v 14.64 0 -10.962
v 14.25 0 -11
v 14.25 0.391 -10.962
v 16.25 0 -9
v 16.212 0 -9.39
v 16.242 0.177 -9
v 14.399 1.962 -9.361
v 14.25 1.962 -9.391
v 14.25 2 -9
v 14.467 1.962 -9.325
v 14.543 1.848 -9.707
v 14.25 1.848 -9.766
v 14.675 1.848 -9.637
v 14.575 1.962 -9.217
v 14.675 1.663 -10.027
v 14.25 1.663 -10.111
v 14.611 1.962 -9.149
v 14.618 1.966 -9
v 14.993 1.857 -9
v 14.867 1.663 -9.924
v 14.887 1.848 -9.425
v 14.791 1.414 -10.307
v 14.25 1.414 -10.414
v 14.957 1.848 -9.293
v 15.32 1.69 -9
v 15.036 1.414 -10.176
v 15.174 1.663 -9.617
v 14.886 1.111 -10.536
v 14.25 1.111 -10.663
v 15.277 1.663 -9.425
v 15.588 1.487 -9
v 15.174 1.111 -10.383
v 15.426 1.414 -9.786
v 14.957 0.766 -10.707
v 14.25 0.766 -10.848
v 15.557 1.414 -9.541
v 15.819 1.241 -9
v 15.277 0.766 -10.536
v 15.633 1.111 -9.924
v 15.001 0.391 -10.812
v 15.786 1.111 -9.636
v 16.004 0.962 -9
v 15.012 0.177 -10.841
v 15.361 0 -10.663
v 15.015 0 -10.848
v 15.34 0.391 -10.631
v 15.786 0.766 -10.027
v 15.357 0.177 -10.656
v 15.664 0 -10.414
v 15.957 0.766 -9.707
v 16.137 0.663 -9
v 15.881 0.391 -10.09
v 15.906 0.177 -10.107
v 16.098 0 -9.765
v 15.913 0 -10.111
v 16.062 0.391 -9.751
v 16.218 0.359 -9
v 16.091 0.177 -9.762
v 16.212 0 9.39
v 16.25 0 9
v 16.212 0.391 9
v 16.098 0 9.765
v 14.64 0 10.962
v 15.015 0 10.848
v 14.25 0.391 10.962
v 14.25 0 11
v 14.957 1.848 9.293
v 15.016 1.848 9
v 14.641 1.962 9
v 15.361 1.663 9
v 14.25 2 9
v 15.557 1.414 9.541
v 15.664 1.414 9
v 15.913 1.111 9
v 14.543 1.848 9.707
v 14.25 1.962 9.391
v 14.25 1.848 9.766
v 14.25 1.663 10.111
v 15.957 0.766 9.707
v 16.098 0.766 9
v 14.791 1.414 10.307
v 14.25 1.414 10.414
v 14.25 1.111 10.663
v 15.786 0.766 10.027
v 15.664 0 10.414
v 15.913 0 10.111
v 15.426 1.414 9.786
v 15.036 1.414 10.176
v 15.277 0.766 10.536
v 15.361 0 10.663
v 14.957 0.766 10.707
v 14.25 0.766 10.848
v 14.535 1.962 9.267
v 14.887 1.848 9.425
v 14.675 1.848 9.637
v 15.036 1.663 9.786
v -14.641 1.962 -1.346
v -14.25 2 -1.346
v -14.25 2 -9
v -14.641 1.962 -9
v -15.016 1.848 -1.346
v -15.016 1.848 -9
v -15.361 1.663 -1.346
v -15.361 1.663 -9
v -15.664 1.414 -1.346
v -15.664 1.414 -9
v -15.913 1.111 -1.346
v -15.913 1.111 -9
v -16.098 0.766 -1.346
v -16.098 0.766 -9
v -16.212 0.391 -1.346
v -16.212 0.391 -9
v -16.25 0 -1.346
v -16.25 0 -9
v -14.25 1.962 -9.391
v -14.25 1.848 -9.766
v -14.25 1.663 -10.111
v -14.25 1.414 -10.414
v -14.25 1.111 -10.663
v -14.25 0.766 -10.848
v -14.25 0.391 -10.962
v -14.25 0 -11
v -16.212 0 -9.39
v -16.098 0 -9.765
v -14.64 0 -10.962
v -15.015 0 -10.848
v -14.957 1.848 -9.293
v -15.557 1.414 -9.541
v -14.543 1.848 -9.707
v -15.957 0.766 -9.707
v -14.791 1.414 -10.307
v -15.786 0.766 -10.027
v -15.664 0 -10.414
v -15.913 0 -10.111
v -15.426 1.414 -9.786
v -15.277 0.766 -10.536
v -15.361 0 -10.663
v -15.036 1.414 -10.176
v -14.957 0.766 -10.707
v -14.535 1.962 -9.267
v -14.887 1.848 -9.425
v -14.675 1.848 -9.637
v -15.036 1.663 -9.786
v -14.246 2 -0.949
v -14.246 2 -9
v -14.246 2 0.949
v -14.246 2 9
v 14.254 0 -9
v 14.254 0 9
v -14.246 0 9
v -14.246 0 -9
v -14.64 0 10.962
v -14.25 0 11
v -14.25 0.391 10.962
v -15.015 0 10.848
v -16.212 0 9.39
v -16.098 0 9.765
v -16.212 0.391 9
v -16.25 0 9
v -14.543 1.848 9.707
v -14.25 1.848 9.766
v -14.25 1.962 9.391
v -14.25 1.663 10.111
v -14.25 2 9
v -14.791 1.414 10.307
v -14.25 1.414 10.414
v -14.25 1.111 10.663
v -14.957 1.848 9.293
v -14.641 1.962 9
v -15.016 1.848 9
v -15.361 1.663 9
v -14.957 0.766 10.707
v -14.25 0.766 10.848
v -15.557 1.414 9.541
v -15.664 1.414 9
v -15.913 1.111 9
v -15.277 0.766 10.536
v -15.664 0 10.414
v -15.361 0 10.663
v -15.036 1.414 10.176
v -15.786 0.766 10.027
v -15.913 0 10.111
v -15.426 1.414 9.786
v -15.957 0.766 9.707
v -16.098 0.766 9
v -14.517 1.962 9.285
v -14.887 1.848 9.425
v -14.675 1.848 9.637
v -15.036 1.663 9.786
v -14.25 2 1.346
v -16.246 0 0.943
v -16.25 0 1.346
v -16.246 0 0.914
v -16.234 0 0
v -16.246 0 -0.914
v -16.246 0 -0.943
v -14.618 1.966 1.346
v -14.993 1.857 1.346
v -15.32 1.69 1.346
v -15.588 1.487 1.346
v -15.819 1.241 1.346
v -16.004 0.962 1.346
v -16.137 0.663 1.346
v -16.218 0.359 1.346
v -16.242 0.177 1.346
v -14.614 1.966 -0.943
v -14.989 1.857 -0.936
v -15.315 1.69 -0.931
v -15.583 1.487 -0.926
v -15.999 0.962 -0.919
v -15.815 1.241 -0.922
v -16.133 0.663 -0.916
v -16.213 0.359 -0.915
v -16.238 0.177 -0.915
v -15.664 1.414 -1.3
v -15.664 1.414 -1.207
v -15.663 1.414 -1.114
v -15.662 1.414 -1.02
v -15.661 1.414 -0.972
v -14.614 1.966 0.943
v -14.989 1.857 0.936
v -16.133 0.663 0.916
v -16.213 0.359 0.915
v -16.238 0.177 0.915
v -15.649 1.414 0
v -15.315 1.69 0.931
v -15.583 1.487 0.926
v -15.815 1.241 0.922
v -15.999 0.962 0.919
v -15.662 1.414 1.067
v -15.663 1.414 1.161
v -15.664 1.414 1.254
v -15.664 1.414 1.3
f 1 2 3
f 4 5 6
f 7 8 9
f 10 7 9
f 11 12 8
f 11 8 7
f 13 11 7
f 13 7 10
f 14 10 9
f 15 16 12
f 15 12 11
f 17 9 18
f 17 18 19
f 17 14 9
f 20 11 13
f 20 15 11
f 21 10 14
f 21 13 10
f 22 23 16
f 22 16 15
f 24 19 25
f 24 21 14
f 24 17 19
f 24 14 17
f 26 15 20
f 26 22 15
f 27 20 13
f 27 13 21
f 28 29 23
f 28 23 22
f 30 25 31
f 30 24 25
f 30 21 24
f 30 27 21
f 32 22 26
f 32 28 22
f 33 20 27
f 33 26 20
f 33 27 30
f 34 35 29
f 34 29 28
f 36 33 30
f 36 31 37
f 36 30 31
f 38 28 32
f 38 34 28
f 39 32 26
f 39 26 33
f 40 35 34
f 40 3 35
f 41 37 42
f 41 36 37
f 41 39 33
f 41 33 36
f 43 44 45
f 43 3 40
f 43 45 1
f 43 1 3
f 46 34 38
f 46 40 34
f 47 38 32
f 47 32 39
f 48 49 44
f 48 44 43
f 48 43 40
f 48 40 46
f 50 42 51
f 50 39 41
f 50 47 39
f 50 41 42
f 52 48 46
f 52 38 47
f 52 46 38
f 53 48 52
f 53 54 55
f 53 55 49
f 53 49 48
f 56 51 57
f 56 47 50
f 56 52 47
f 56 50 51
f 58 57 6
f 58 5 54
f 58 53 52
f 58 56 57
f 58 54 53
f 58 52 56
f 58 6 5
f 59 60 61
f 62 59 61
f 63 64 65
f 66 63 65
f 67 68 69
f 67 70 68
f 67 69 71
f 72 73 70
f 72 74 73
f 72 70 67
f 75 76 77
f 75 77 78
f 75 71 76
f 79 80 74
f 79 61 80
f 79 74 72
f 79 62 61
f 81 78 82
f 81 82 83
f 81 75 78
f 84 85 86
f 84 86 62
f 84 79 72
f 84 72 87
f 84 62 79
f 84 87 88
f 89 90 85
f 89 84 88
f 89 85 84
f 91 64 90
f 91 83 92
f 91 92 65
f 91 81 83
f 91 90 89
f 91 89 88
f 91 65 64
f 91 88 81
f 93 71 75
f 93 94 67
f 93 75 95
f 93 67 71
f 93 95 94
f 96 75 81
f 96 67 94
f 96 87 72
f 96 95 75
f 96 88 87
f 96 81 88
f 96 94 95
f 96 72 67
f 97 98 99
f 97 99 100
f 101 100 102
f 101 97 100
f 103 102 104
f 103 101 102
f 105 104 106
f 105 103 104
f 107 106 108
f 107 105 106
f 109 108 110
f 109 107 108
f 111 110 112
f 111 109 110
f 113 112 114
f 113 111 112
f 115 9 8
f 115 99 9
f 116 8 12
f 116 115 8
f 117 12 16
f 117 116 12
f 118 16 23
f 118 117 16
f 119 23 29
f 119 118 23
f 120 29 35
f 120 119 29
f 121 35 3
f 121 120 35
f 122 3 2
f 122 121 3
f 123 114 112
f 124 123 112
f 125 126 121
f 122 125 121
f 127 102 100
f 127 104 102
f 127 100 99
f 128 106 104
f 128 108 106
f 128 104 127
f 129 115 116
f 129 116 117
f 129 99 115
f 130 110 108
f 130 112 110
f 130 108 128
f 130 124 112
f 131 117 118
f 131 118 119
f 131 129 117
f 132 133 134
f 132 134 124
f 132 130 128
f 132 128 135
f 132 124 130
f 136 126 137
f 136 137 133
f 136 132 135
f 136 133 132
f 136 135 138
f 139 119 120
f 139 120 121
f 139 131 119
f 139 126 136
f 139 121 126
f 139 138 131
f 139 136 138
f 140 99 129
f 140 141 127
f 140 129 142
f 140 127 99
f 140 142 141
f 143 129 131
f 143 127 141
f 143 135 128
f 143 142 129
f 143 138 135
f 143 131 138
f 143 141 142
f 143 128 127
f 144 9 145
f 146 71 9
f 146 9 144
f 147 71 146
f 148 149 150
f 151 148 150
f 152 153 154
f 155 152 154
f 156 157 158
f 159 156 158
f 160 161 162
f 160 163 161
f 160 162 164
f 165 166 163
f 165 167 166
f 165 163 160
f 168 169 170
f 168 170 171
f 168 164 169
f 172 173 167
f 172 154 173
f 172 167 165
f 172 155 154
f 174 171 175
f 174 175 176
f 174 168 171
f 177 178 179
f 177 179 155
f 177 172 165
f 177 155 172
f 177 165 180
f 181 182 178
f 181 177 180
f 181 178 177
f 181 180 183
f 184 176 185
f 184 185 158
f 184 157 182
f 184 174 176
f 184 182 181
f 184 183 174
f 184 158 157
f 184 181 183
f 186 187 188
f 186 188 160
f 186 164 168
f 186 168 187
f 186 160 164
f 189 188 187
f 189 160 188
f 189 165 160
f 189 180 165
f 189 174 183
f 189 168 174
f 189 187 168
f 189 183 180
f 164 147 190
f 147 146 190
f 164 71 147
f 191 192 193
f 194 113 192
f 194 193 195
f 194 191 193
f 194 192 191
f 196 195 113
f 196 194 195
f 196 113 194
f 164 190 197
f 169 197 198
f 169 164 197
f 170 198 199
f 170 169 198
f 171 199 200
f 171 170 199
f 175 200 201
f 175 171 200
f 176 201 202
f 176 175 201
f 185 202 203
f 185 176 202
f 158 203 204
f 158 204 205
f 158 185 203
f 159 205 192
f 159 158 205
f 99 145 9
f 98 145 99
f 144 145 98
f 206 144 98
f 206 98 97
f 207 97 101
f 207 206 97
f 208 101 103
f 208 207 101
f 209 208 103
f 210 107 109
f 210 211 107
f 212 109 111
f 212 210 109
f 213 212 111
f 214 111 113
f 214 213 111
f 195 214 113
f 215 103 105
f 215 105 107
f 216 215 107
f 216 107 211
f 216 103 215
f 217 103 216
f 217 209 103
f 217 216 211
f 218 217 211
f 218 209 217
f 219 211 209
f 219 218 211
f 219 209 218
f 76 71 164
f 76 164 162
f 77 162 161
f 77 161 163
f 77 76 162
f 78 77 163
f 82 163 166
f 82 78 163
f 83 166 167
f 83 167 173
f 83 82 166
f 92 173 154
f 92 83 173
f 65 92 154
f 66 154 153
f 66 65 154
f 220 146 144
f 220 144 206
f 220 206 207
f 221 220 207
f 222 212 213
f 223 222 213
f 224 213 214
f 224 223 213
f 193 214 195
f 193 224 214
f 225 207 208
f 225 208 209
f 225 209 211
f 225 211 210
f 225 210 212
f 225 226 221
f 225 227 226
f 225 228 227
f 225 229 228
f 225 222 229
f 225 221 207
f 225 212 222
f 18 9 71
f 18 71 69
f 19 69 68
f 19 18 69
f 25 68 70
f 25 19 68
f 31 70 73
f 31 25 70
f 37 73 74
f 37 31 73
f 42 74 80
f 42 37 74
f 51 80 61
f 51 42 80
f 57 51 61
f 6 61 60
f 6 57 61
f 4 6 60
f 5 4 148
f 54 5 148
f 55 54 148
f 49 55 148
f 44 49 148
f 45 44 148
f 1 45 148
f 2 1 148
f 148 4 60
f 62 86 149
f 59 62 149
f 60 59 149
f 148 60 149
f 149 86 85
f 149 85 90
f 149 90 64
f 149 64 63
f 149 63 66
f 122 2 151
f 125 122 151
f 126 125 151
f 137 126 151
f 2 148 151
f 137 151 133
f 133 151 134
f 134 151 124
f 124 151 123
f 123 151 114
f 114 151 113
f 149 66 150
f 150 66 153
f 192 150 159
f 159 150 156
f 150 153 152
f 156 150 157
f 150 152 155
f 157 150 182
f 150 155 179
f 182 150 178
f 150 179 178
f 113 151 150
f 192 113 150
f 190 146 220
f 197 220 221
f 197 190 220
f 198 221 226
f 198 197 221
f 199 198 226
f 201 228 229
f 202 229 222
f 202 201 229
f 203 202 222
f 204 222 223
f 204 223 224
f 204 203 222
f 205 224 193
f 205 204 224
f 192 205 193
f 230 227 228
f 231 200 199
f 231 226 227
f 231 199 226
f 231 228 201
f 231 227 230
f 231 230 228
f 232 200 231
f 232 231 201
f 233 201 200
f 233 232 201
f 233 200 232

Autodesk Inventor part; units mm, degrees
ref_plane "YZ Plane" through (0, 0, 0) normal (1, 0, 0) x (0, 1, 0)
ref_plane "XZ Plane" through (0, 0, 0) normal (0, 1, 0) x (-1, 0, 0)
ref_plane "XY Plane" through (0, 0, 0) normal (0, 0, 1) x (1, 0, 0)
sketch "Szkic1" plane through (0, 0, 0) normal (0, 1, 0) x (-1, 0, 0)
  spline S0 degree 3 poles (16.25, 1.3463) (16.25, 1.2202) (16.2481, 1.0689) (16.2413, 0.6482) (16.2343, 0.2947) (16.2343, 0) (16.2343, -0.2947) (16.2413, -0.6482) (16.2481, -1.0689) (16.25, -1.2202) (16.25, -1.3463) knots 1.975425 1.975425 1.975425 1.975425 2.013257 2.013257 2.101653 2.101653 2.101653 2.190049 2.190049 2.22788 2.22788 2.22788 2.22788
  line L0 (16.25, 1.3463) -> (16.25, 9)
  arc A0 (16.25, 9) -> (14.25, 11) centre (14.25, 9) ccw
  line L1 (14.25, 11) -> (-14.25, 11)
  arc A1 (-14.25, 11) -> (-16.25, 9) centre (-14.25, 9) ccw
  line L2 (-16.25, 9) -> (-16.25, -9)
  arc A2 (-16.25, -9) -> (-14.25, -11) centre (-14.25, -9) ccw
  line L3 (-14.25, -11) -> (14.25, -11)
  arc A3 (14.25, -11) -> (16.25, -9) centre (14.25, -9) ccw
  line L4 (16.25, -9) -> (16.25, -1.3463)
  line L5 (-14.2536, -9) -> (-14.2536, 9)
  line L6 (-14.2536, 9) -> (14.2464, 9)
  line L7 (14.2464, 9) -> (14.2464, -9)
  line L8 (14.2464, -9) -> (-14.2536, -9)
  spline S1 degree 3 poles (16.25, 1.3463) (16.25, 1.2202) (16.2481, 1.0689) (16.2413, 0.6482) (16.2343, 0.2947) (16.2343, 0) (16.2343, -0.2947) (16.2413, -0.6482) (16.2481, -1.0689) (16.25, -1.2202) (16.25, -1.3463) knots 1.975425 1.975425 1.975425 1.975425 2.013257 2.013257 2.101653 2.101653 2.101653 2.190049 2.190049 2.22788 2.22788 2.22788 2.22788
  line L9 (16.25, 1.3463) -> (16.25, 9)
  arc A4 (16.25, 9) -> (14.25, 11) centre (14.25, 9) ccw
  line L10 (14.25, 11) -> (-14.25, 11)
  arc A5 (-14.25, 11) -> (-16.25, 9) centre (-14.25, 9) ccw
  line L11 (-16.25, 9) -> (-16.25, -9)
  arc A6 (-16.25, -9) -> (-14.25, -11) centre (-14.25, -9) ccw
  line L12 (-14.25, -11) -> (14.25, -11)
  arc A7 (14.25, -11) -> (16.25, -9) centre (14.25, -9) ccw
  line L13 (16.25, -9) -> (16.25, -1.3463)
  line L14 (-14.2536, -9) -> (-14.2536, 9)
  line L15 (-14.2536, 9) -> (14.2464, 9)
  line L16 (14.2464, 9) -> (14.2464, -9)
  line L17 (14.2464, -9) -> (-14.2536, -9)
  point P0 (0, 0)
  point P1 (0, 0)
extrude "Wyciągnięcie proste1" add sketch "Szkic1" along normal blind 2 contours S0 L4 A3 L3 A2 L2 A1 L1 A0 L0 | L5 L6 L7 L8
fillet "Zaokrąglenie1" radius 2 10 edges at (15.6642, 2, 10.4142) (16.25, 2, 0) (15.6642, 2, -10.4142) (0, 2, -11) (-15.6642, 2, -10.4142) (-16.25, 2, -5.1731) (-16.2343, 2, 0) (-16.25, 2, 5.1731) (-15.6642, 2, 10.4142) (0, 2, 11)
properties part number "ładowarka usb v2 przykrywka"
